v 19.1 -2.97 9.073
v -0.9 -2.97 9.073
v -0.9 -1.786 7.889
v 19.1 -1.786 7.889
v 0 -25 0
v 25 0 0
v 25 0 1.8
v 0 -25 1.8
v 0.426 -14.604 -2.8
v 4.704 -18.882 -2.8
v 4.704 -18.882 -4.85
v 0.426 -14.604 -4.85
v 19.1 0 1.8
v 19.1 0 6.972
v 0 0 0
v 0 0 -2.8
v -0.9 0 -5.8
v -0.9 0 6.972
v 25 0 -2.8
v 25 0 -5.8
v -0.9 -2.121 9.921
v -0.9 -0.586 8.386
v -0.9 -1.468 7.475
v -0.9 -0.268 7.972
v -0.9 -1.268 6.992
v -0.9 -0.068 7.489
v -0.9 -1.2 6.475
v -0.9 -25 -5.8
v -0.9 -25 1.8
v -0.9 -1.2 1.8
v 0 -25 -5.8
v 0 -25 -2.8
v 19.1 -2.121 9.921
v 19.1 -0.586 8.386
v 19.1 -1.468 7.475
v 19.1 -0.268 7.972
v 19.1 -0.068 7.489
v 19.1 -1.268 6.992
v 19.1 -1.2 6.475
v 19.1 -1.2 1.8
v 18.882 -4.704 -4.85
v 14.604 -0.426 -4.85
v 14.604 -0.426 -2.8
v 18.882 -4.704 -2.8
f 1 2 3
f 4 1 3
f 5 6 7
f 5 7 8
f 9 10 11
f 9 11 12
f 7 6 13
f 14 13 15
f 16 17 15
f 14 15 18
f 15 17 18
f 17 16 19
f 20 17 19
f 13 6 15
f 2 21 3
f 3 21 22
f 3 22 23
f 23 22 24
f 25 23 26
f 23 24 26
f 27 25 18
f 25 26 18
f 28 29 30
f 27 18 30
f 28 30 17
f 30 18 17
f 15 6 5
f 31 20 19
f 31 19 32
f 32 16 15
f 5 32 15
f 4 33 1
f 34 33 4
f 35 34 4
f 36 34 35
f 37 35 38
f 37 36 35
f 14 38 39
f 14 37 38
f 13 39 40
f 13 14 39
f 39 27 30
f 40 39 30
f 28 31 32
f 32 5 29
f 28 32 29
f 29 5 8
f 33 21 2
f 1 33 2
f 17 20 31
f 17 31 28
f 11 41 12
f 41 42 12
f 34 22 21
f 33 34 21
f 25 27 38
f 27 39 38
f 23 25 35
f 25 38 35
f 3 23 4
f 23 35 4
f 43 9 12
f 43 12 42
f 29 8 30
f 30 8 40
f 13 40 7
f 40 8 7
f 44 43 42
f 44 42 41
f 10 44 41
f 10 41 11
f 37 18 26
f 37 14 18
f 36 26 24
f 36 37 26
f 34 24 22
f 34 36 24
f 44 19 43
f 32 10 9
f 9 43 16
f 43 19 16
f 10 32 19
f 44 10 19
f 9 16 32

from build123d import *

# Parameters (mm, degrees)
SALIENTE_EXTRUIR1_DEPTH = 1.8
CROQUIS2_W              = 7.6
CROQUIS2_H              = 25
SALIENTE_EXTRUIR2_DEPTH = 0.9
SALIENTE_EXTRUIR3_DEPTH = 3
CORTAR_EXTRUIR1_DEPTH   = 2.05
SALIENTE_EXTRUIR4_DEPTH = 20
REDONDEO1_R             = 2


with BuildPart() as part:
    # Croquis1 → Saliente-Extruir1 (new body)
    with BuildSketch(Plane.XY):
        Polygon((0, 0), (25, 0), (0, -25), align=None)
    extrude(amount=SALIENTE_EXTRUIR1_DEPTH)

    # Croquis2 → Saliente-Extruir2 (add)
    with BuildSketch(Plane.ZY):
        with Locations((-2, -12.5)):
            Rectangle(CROQUIS2_W, CROQUIS2_H)
    extrude(amount=SALIENTE_EXTRUIR2_DEPTH)

    # Croquis3 → Saliente-Extruir3 (add)
    with BuildSketch(Plane(origin=(0, 0, -5.8), x_dir=(-1, 0, 0), z_dir=(0, 0, -1))):
        Polygon((0, 0), (-25, 0), (0, -25), align=None)
    extrude(amount=-SALIENTE_EXTRUIR3_DEPTH)

    # Croquis4 → Cortar-Extruir1 (cut)
    with BuildSketch(Plane.XY.offset(-2.8)):
        Polygon((18.8816387, -4.704147737), (4.704147737, -18.8816387), (0.426151711, -14.603642674), (14.603642674, -0.426151711), align=None)
    extrude(amount=-CORTAR_EXTRUIR1_DEPTH, mode=Mode.SUBTRACT)

    # Croquis5 → Saliente-Extruir4 (add)
    with BuildSketch(Plane.ZY.offset(0.9)):
        Polygon((1.8, 0), (7.8, 0), (9.921320344, -2.121320344), (9.072792206, -2.969848481), (7.302943725, -1.2), (1.8, -1.2), align=None)
    extrude(amount=-SALIENTE_EXTRUIR4_DEPTH)

    # Redondeo1
    redondeo1_edges = [part.edges().sort_by_distance(p)[0] for p in [
        (9.1, 0, 7.8),
        (9.1, -1.2, 7.302943725),
    ]]
    fillet(redondeo1_edges, radius=REDONDEO1_R)


solid = part.part
